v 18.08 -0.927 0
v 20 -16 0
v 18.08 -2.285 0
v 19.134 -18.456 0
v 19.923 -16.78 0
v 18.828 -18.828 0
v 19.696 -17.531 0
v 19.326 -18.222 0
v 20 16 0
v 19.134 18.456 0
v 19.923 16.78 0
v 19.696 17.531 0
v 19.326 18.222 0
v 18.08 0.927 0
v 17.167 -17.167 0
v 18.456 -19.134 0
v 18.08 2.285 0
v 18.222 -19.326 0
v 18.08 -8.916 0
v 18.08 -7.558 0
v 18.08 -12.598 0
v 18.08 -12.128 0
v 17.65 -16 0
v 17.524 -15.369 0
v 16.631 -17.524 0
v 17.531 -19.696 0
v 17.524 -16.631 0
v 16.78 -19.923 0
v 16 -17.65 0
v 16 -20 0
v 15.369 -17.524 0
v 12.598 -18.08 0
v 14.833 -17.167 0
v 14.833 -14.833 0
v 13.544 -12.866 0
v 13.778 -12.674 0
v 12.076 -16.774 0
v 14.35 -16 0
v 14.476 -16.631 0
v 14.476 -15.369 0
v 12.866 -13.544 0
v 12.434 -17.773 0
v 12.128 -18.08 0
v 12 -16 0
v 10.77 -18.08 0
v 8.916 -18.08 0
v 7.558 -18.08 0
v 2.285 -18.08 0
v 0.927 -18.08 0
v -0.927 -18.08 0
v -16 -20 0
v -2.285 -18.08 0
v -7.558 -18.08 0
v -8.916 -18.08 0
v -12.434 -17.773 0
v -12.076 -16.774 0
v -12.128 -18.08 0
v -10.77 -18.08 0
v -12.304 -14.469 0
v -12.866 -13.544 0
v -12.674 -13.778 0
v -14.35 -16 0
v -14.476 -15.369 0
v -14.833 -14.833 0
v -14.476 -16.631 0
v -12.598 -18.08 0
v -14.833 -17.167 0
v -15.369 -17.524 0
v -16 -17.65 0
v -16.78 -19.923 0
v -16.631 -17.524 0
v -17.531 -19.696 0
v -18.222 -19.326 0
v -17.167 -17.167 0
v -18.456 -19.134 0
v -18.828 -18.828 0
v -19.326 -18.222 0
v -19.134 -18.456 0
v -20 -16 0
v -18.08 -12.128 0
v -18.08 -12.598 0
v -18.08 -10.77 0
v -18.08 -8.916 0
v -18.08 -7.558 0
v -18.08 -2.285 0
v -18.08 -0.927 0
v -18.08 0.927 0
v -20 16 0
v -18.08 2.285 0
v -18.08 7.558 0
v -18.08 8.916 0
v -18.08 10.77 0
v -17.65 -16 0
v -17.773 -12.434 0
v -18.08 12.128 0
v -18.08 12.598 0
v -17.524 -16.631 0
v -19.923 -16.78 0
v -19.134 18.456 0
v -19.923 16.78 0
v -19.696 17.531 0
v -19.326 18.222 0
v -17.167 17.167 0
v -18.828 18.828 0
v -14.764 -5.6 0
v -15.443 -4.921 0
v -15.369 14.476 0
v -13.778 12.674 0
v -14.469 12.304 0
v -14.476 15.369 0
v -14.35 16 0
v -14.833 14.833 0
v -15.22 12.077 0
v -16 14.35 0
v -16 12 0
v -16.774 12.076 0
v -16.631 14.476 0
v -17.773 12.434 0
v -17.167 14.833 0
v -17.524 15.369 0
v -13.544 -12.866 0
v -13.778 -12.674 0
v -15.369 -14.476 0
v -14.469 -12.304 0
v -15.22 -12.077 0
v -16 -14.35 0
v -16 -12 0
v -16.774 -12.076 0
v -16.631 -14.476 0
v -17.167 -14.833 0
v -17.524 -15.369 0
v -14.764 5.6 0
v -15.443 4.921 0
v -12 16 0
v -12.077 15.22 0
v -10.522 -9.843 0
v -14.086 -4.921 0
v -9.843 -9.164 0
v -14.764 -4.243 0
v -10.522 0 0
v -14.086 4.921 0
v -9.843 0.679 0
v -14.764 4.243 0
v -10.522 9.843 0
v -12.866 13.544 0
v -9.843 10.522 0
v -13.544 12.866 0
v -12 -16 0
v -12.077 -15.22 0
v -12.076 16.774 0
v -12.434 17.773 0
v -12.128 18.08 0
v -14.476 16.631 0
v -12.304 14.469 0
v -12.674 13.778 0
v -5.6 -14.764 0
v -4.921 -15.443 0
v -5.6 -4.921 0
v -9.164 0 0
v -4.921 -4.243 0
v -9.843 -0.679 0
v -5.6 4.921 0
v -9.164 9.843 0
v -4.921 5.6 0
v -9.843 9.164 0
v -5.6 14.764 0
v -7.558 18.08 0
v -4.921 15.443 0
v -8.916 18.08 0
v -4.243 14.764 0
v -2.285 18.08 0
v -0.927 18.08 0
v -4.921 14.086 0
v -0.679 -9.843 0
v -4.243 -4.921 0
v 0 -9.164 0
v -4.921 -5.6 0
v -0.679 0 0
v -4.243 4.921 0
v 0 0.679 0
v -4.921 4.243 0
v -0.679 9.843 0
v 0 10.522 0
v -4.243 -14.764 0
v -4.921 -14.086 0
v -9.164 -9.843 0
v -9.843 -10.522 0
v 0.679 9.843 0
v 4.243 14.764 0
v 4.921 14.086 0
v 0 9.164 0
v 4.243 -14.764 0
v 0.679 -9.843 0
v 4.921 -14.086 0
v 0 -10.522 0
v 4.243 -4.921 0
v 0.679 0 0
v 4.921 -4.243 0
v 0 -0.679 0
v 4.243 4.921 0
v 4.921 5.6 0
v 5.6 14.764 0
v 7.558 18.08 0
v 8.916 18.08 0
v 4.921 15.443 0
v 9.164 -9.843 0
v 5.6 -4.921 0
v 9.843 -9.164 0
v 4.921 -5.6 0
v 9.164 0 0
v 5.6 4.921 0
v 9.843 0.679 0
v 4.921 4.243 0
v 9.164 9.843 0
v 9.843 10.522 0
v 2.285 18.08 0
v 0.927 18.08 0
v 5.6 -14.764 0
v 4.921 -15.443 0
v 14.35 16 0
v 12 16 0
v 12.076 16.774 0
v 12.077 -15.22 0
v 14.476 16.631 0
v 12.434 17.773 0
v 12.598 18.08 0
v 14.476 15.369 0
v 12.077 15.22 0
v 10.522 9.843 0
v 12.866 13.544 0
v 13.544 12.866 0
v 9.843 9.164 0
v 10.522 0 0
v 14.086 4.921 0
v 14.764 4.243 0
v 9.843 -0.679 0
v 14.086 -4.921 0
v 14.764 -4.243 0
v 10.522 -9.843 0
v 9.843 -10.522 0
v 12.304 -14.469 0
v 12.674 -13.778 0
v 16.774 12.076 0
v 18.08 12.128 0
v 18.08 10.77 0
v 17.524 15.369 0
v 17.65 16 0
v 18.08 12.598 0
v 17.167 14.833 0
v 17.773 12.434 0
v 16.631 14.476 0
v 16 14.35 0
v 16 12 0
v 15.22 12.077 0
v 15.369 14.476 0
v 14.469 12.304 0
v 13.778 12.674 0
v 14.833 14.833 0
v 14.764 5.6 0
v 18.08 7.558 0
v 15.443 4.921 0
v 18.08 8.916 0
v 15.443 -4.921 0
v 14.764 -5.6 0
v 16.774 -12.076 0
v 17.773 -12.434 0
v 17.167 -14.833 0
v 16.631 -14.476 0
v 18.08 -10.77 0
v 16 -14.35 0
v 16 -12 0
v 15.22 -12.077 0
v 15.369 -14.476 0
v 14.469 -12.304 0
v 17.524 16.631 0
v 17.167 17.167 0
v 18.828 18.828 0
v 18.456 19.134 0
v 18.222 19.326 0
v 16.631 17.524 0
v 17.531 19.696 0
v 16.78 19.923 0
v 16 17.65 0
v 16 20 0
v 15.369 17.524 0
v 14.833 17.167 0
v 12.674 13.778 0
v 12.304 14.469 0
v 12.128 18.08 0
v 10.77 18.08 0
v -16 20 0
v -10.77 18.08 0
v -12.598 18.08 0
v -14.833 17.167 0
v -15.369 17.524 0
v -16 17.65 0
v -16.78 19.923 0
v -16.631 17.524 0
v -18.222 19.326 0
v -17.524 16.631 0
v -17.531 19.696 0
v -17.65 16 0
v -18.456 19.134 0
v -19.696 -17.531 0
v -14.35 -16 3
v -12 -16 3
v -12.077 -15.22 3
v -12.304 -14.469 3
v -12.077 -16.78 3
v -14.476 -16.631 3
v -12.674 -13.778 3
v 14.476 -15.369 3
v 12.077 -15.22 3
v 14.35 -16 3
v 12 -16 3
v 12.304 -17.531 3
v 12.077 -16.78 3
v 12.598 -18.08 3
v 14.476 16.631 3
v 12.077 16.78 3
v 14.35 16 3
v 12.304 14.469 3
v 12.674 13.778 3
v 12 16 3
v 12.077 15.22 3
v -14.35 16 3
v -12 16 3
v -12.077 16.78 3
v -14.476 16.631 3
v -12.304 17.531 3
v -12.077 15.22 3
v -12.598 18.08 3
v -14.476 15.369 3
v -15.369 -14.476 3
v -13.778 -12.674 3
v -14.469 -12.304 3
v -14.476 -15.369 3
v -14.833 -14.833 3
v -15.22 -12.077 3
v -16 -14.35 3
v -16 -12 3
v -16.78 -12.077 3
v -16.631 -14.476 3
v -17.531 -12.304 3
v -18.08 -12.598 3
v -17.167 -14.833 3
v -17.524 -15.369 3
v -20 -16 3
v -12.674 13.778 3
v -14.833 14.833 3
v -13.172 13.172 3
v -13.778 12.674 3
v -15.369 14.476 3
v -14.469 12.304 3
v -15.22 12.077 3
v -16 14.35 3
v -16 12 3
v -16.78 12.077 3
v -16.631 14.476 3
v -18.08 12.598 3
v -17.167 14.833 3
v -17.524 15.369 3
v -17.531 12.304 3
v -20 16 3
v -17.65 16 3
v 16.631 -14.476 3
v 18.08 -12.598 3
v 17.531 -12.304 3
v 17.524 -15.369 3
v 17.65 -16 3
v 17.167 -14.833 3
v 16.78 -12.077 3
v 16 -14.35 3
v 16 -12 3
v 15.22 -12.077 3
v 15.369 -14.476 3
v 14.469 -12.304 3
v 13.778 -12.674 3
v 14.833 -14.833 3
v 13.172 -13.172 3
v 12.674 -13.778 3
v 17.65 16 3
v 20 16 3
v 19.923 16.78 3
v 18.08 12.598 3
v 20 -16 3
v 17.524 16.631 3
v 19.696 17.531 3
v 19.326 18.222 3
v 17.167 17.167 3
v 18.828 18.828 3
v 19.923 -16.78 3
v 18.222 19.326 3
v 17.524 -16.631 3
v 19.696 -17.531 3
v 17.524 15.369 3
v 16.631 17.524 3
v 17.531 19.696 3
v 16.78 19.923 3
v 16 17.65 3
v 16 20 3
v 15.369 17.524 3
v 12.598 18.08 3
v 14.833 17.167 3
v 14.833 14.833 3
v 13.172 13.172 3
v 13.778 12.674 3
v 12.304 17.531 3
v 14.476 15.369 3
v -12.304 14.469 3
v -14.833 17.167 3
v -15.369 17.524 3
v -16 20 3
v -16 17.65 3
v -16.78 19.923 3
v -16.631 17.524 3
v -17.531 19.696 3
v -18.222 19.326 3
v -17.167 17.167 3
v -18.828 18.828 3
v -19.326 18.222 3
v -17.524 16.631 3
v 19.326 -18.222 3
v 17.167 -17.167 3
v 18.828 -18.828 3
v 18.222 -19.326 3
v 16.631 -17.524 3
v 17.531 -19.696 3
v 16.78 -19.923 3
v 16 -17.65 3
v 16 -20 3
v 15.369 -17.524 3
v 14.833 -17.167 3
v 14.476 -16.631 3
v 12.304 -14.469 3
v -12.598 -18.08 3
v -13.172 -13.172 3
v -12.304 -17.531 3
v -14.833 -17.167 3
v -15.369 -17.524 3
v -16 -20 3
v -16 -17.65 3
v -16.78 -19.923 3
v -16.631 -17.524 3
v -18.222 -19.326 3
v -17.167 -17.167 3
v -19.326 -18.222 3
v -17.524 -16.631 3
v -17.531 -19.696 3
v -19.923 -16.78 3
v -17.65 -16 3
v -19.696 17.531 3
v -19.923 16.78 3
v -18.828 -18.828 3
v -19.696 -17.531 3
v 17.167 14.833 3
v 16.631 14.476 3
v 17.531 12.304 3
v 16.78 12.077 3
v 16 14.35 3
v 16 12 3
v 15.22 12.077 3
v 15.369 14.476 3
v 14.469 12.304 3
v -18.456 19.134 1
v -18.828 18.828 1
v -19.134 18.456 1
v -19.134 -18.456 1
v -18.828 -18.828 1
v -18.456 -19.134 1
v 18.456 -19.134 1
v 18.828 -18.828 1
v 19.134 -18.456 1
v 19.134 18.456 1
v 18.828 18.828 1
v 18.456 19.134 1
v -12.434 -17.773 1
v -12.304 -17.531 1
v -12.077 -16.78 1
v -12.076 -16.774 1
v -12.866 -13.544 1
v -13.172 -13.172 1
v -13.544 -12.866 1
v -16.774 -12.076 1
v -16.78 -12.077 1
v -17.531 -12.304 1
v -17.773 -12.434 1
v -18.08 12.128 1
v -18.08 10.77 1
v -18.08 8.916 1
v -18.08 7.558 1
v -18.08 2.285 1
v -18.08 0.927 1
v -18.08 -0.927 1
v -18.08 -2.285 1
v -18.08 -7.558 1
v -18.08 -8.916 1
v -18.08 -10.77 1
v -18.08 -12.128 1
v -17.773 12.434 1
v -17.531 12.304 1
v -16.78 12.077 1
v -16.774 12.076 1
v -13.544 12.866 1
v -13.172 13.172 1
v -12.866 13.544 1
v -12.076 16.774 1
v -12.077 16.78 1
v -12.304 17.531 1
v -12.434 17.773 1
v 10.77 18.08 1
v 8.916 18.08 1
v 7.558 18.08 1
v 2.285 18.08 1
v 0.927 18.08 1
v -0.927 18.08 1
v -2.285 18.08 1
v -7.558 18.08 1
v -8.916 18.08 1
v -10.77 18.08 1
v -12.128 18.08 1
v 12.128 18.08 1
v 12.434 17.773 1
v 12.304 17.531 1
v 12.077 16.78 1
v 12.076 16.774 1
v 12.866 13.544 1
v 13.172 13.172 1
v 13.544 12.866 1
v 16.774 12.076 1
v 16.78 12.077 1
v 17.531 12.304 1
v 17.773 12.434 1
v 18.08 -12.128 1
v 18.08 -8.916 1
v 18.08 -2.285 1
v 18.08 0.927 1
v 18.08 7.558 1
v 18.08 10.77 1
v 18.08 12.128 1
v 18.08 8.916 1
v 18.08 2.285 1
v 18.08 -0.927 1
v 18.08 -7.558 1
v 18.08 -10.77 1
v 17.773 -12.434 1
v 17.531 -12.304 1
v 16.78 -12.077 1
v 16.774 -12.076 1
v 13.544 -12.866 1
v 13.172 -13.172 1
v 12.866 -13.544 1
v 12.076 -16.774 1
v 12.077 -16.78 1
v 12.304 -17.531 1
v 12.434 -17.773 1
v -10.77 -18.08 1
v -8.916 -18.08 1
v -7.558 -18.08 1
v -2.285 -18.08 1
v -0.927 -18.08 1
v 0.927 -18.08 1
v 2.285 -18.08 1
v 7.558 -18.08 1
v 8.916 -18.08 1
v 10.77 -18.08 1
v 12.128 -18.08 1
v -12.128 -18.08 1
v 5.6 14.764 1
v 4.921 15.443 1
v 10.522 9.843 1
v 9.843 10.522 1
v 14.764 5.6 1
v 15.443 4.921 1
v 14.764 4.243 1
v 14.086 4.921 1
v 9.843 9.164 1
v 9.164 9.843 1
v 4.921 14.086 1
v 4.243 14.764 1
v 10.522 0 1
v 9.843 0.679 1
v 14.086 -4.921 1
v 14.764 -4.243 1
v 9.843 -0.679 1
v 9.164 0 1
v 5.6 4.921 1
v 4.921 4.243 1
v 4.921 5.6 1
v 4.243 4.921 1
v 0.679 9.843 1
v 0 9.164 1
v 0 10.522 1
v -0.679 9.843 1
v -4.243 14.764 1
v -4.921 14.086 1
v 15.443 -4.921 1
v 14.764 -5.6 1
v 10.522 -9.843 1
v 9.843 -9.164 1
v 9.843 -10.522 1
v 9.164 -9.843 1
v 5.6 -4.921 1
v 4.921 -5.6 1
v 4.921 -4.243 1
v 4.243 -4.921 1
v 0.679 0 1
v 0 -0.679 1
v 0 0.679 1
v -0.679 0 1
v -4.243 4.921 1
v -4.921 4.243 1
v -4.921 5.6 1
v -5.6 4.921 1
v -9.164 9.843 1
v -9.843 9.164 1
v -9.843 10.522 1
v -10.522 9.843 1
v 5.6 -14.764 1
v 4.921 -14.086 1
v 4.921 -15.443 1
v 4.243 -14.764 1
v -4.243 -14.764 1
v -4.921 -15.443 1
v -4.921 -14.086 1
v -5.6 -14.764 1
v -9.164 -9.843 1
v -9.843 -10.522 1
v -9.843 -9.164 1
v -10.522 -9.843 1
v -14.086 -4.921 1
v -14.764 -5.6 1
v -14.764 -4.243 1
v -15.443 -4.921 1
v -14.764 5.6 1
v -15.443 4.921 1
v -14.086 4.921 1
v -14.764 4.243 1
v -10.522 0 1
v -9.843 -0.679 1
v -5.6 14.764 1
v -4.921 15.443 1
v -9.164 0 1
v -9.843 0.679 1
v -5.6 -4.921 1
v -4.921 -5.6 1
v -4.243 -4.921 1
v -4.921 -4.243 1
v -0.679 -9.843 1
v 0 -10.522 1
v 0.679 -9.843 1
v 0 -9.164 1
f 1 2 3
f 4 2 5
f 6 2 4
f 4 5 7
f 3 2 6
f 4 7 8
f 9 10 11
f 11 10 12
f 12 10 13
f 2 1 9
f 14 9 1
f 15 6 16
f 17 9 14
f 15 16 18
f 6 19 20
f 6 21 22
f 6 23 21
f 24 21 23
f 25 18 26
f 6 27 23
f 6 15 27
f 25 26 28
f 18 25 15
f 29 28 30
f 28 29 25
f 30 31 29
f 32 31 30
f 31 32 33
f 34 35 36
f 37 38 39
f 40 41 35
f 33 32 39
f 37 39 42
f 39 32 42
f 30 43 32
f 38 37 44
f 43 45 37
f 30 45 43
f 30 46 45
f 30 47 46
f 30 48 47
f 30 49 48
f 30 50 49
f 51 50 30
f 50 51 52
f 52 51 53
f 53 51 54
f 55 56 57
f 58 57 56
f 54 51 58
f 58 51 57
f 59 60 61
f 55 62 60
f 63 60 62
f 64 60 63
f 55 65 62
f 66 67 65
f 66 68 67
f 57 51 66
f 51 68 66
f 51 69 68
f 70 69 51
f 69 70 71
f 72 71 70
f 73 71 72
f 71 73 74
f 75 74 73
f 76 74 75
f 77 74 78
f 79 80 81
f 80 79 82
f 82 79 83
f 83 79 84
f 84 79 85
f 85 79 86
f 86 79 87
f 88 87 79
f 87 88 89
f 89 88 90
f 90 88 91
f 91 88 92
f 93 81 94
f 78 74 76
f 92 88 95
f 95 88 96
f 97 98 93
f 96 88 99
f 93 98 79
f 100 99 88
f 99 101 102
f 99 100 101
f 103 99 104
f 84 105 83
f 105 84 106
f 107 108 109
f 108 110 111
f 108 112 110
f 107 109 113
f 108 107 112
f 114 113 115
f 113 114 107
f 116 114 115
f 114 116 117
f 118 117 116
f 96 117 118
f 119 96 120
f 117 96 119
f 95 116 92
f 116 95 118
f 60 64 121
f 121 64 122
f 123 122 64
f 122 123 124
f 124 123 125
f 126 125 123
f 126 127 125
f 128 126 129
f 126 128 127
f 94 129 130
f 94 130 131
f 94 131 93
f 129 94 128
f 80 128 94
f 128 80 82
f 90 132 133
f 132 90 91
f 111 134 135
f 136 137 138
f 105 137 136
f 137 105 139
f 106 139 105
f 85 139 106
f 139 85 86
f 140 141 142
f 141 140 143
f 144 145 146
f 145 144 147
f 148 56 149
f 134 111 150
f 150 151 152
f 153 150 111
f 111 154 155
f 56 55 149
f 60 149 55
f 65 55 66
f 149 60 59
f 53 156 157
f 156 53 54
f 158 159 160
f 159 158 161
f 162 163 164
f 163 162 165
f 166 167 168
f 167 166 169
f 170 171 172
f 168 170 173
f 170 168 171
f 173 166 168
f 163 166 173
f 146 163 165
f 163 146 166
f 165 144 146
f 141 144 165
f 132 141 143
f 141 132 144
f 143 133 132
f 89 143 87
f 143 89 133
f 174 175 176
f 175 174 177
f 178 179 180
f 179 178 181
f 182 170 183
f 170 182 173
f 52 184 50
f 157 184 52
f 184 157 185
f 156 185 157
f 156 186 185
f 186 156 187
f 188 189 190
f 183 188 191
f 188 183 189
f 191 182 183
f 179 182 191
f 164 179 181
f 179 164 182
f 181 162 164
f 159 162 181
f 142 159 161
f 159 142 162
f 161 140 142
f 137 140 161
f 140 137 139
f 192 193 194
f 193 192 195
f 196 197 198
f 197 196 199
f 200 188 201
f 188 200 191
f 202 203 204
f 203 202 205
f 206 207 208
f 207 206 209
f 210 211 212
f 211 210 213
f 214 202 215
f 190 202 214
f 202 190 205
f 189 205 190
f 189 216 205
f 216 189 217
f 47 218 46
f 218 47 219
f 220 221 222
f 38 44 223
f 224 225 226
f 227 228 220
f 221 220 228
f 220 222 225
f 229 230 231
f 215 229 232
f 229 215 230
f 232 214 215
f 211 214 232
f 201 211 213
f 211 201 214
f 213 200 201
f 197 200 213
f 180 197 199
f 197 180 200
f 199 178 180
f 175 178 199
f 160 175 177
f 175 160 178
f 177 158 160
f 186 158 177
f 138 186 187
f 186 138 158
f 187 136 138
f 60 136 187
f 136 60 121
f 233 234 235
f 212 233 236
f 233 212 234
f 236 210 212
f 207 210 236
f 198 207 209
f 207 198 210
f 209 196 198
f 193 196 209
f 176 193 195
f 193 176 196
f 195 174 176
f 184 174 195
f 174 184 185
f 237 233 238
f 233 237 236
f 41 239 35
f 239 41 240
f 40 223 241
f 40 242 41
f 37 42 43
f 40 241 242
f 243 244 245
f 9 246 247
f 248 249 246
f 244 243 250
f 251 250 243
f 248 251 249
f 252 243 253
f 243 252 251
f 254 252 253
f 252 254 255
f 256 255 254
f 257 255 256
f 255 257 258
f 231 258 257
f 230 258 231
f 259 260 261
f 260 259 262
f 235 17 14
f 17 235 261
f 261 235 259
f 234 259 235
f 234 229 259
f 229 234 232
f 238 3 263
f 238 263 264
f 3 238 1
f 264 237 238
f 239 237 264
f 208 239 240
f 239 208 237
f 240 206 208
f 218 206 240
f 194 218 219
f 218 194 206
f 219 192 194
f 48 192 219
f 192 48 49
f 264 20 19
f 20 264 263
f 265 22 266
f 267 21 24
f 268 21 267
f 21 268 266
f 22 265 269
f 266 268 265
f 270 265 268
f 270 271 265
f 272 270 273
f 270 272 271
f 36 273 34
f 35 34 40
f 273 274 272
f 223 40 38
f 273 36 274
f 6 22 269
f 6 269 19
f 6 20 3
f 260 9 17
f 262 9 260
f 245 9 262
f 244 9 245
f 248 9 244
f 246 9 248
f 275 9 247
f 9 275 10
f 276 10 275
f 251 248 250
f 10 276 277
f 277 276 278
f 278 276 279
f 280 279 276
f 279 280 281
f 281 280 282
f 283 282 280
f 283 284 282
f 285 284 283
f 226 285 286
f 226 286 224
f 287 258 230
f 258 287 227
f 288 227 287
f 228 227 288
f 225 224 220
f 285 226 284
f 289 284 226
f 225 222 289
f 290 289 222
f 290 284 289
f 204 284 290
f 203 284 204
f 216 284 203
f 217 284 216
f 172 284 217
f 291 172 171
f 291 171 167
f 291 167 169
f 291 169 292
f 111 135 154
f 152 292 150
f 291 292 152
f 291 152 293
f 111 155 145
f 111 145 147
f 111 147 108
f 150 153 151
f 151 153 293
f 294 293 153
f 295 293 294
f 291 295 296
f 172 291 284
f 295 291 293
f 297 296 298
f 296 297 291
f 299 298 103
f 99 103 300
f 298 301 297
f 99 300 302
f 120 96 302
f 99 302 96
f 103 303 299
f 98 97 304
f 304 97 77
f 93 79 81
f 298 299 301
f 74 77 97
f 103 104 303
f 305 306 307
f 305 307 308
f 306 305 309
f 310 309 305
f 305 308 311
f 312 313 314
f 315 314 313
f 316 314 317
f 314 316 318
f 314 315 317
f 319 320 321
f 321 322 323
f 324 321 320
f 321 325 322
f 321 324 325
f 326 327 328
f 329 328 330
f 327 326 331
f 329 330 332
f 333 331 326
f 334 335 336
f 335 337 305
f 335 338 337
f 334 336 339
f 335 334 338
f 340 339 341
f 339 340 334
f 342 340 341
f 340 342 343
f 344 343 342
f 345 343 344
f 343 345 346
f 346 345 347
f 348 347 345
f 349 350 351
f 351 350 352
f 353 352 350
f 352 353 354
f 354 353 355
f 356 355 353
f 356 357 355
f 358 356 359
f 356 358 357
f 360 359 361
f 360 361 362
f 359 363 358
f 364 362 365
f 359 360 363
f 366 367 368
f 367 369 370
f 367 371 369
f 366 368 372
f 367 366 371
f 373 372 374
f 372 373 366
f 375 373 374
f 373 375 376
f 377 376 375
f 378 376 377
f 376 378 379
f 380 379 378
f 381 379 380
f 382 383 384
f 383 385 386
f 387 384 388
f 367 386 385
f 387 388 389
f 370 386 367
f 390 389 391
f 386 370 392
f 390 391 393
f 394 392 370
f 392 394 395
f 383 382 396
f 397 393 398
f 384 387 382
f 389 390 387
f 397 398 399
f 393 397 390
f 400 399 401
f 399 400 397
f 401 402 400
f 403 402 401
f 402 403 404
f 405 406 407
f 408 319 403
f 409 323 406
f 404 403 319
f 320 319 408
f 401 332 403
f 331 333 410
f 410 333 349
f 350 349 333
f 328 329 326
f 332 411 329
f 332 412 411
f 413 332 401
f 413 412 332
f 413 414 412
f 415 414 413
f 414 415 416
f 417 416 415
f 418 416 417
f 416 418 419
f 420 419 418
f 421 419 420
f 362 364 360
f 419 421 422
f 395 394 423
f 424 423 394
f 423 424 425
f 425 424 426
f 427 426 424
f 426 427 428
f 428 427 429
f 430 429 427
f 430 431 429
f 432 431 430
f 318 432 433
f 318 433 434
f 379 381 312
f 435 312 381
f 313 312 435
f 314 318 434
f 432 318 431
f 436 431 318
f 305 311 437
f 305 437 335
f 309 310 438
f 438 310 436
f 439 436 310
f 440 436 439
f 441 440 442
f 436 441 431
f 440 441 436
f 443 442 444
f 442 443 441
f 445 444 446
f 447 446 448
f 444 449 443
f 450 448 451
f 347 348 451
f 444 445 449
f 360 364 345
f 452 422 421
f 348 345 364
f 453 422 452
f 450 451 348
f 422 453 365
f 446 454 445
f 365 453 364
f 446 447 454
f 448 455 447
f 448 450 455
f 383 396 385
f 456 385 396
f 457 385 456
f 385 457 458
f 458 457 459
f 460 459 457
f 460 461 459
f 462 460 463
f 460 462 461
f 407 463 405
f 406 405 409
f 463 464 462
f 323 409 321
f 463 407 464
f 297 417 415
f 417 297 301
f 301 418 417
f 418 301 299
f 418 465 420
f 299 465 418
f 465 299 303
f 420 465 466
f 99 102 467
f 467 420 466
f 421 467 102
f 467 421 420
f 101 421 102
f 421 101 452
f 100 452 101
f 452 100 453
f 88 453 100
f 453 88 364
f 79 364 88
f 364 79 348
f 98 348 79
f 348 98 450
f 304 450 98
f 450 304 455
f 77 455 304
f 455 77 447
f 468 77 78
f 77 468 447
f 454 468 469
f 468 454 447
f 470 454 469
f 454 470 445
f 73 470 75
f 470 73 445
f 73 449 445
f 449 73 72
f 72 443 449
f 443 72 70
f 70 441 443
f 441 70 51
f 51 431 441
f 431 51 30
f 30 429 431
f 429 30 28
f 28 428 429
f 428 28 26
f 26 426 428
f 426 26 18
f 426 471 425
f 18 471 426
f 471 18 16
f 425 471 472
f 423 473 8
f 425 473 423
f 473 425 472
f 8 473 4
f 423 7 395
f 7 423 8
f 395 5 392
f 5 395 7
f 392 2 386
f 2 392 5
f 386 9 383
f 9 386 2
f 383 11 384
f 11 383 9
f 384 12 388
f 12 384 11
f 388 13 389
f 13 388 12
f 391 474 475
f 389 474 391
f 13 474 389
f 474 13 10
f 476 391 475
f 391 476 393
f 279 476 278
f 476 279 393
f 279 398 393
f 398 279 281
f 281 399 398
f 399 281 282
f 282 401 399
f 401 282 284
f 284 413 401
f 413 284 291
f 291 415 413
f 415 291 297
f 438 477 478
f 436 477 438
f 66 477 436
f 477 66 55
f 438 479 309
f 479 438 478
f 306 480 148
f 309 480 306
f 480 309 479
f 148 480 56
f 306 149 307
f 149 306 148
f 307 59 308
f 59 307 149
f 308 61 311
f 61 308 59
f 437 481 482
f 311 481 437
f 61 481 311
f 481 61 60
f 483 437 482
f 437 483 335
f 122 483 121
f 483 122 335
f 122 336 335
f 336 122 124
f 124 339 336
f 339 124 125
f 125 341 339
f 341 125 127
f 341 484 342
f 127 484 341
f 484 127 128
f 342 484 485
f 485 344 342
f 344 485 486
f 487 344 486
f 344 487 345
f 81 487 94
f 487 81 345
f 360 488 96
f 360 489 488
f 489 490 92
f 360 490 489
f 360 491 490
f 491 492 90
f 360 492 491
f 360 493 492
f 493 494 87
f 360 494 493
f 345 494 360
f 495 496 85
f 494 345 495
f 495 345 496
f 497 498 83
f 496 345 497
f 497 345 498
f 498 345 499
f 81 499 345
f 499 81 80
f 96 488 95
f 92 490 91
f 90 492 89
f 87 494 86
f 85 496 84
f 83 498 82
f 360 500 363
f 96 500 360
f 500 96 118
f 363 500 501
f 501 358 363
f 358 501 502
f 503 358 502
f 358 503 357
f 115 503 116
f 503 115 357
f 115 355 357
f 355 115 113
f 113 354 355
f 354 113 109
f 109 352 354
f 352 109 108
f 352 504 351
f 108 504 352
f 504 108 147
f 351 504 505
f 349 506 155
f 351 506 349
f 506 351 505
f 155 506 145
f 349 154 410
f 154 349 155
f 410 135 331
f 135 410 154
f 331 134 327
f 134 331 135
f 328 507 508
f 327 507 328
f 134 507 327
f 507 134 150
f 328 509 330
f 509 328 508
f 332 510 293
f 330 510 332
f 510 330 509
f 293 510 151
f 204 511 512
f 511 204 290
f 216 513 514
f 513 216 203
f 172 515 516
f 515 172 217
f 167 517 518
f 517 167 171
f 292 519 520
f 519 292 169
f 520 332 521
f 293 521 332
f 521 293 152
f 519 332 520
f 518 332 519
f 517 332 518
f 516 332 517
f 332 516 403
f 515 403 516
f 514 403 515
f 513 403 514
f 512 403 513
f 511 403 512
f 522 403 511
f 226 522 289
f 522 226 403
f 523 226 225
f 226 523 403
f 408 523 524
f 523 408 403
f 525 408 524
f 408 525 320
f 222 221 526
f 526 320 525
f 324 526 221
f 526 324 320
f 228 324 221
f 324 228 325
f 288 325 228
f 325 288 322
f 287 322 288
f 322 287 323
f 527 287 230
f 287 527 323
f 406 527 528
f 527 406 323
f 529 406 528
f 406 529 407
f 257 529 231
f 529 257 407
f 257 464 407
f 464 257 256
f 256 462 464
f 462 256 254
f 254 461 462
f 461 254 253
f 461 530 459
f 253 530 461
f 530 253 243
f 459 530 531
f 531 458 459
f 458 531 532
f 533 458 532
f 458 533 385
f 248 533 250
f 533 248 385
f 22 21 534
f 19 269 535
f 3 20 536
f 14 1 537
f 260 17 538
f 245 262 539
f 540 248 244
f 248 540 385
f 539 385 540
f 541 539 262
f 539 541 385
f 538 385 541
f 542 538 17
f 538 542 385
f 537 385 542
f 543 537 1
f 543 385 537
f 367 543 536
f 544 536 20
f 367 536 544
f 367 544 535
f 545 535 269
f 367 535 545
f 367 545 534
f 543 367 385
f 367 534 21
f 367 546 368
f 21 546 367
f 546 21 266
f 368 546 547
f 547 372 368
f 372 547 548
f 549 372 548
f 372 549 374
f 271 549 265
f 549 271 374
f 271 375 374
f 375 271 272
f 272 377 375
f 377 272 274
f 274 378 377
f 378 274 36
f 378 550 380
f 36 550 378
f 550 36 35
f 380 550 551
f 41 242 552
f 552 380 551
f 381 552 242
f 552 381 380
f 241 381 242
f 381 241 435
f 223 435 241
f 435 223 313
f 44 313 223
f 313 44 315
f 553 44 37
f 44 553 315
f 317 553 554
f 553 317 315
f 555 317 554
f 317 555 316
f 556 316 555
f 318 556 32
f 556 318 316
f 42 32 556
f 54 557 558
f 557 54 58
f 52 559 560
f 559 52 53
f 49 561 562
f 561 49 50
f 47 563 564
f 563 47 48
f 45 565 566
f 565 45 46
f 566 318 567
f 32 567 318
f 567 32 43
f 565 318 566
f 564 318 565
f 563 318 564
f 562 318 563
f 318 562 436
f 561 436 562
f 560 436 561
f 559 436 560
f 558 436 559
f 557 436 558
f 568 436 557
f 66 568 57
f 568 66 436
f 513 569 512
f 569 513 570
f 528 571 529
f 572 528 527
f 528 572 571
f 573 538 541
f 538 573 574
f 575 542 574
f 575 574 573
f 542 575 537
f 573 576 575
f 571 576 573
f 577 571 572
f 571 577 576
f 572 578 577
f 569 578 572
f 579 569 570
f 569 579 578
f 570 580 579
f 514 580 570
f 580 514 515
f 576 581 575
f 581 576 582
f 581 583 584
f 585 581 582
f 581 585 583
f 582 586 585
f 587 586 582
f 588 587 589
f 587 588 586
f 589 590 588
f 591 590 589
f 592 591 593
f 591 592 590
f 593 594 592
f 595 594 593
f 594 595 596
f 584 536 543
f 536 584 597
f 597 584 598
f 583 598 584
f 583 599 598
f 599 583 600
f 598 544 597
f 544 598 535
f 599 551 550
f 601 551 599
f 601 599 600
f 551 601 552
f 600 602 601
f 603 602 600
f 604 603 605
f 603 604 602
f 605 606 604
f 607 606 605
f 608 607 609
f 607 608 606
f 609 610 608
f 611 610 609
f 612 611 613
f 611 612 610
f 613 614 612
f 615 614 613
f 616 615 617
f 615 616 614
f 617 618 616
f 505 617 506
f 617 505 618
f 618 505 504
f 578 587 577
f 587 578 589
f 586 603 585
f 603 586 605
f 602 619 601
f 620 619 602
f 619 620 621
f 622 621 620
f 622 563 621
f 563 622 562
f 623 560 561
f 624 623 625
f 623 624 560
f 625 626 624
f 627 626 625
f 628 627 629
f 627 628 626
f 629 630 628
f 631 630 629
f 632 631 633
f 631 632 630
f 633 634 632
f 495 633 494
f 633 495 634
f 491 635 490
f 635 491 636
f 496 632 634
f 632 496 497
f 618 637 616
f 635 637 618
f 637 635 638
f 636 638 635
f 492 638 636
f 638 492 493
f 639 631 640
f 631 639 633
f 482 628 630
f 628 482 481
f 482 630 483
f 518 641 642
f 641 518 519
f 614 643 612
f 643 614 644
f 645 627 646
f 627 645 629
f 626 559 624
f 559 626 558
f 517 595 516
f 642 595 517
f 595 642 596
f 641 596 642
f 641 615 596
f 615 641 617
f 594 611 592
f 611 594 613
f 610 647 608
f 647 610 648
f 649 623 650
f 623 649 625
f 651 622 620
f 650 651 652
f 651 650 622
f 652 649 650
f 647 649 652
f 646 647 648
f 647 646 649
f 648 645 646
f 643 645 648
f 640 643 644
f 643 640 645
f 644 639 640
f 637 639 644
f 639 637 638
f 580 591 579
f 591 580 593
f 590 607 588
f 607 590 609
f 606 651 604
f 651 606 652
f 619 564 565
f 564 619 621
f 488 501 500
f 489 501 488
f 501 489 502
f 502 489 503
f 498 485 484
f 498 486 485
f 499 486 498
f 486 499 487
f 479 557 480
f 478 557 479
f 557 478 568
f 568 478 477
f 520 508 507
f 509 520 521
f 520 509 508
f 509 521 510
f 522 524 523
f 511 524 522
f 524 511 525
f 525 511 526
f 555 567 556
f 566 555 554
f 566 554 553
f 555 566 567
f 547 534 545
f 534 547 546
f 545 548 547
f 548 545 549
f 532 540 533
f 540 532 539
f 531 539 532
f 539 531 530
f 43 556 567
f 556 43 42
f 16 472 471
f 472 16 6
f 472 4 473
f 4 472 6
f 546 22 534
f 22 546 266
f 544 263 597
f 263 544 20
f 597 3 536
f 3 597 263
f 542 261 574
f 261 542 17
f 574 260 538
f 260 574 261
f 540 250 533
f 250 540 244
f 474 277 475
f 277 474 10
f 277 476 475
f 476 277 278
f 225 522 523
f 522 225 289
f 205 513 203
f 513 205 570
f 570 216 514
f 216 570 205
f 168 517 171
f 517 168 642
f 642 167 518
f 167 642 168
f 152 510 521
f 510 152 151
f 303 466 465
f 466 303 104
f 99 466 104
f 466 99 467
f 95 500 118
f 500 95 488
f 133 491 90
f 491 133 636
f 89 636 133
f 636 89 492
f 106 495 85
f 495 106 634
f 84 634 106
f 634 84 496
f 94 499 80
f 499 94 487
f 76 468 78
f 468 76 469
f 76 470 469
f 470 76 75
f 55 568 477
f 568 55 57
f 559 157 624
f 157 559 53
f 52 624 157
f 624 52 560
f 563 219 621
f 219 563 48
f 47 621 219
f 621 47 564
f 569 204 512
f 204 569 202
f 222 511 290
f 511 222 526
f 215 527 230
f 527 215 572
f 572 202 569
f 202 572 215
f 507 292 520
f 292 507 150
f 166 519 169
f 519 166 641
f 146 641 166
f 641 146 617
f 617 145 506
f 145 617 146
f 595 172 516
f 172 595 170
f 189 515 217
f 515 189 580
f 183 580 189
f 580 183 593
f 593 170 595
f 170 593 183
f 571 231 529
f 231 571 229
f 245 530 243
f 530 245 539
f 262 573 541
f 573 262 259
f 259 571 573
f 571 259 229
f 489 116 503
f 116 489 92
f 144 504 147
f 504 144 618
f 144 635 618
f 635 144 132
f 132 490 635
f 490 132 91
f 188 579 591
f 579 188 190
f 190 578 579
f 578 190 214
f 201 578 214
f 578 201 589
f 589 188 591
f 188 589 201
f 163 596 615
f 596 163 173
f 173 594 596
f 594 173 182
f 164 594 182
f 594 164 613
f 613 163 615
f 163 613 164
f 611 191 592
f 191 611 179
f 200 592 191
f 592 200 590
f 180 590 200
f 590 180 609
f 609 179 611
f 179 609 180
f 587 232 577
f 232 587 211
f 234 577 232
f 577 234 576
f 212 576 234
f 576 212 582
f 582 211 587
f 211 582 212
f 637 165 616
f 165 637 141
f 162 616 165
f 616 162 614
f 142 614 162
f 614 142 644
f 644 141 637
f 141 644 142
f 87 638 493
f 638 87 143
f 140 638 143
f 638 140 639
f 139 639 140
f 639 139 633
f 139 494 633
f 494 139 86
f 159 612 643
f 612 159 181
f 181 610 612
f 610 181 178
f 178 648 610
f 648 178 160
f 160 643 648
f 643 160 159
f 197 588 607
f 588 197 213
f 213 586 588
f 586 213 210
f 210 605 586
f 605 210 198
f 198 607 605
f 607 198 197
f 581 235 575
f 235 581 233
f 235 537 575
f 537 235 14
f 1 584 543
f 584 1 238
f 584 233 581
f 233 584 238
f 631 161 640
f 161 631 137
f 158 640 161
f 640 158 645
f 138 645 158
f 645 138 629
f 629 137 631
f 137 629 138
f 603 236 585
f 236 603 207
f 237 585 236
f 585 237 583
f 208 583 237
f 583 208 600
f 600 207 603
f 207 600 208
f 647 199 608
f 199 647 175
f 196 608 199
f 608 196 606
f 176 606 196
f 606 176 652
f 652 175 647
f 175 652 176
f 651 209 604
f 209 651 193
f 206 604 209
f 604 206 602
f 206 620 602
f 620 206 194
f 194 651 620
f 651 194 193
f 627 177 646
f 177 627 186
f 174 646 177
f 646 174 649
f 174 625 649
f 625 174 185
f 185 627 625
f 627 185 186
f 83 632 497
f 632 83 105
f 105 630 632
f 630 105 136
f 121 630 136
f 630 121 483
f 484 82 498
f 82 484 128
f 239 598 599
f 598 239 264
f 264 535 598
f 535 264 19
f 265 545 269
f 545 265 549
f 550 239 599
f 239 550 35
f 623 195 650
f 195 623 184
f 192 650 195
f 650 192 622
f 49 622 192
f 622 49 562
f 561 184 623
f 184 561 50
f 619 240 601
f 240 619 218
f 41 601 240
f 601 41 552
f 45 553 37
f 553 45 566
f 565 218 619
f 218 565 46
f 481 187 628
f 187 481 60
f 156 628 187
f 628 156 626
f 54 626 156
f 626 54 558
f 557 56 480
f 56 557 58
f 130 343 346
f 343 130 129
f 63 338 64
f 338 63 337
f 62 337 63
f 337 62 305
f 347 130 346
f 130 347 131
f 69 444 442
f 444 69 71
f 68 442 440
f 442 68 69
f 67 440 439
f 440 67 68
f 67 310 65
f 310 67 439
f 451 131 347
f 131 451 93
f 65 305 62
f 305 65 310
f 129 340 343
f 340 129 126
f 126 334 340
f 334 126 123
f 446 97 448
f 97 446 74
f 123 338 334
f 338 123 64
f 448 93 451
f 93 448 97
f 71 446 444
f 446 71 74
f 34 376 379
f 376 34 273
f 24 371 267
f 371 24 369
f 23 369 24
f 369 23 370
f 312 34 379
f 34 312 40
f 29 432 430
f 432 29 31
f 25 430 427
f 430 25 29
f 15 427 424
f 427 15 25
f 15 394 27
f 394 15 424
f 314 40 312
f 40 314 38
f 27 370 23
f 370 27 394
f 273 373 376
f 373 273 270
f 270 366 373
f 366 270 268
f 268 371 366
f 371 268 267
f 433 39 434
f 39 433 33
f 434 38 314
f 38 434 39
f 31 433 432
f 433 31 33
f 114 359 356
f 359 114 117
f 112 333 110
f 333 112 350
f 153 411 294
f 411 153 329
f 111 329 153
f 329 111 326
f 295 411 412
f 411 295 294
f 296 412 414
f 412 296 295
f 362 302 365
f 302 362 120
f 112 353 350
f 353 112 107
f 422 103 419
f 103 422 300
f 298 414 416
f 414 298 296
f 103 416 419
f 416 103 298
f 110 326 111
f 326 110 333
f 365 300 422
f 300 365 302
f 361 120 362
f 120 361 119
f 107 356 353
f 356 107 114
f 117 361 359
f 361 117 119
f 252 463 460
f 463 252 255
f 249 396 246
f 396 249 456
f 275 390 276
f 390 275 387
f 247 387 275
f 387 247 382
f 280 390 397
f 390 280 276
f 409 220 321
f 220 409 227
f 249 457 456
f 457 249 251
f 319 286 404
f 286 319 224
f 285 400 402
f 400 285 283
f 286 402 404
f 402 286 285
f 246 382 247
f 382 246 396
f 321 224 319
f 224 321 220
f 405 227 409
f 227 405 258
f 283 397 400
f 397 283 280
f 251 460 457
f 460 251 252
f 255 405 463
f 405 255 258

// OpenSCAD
/*
 * Customizable Fan Cover - https://www.thingiverse.com/thing:2802474
 * by Dennis Hofmann - https://www.thingiverse.com/mightynozzle/about
 * created 2018-02-22
 * updated 2018-03-27
 * version v1.2
 *
 * Changelog
 * --------------
 * v1.2:
 *      - better quality of rounded corners and crosshair pattern
 * v1.1:
 *      - added support line option for crosshair and square pattern
 * v1.0:
 *      - final design
 * --------------
 *
 * This work is licensed under the Creative Commons - Attribution - Non-Commercial - ShareAlike license.
 * https://creativecommons.org/licenses/by-nc-sa/3.0/
 */


 // Parameter Section //
//-------------------//

/* [Global Settings] */

// Choose between presets of known and common fan sizes.
fan_preset = "custom"; //[25:25mm,30:30mm,40:40mm,50:50mm,60:60mm,70:70mm,80:80mm,92:92mm,120:120mm,140:140mm,custom:Custom Fan Settings]

// If you want save to save about 40% filament and about 20% printing time, you can choose the reduced frame option.
frame_option = "reduced"; //[full,reduced]

// Minimum Border Size. I recommend to use two/four/six... times of your line width setting of your slicer. Simplify3D uses 0.48mm line width by default if you are using a 0.4mm nozzle. Cura uses 0.4mm line width.
min_border_size_in_millimeter = 1.92;

// Choose between a grill pattern
grill_pattern = "grid"; //[honeycomb,grid,line,triangle,crosshair,square,dot,aperture]

// Set the angle of the pattern around the center of the cover.
grill_pattern_rotation = 45; //[0:5:360]

// Size of the pattern lines. I recommend to use two/four/six... times of your line width setting of your slicer. Simplify3D uses 0.48mm line width by default if you are using a 0.4mm nozzle. Cura uses 0.4mm line width.
line_size_in_millimter = 0.96; //[0.3:0.02:4]

// Space between two lines of your pattern. If you choose aperture pattern, this value set the size of the center octagon.
line_space_in_millimeter = 6; //[1:0.1:50]

// If you need countersunk holes, you can activate it here. Bottom = first layer. Top = last layer. 
screw_hole_chamfer = "no"; //[no,top,bottom,top_and_bottom]

// Activate or deactivate rounded corners. The radius will be automatically calculated.
rounded_corners = "yes"; //[yes,no]

// number of straight lines supporting the crosshair or square pattern.
number_of_support_lines = 2;  //[1:1:36]

/* [Custom Fan Settings] */

// Cover size. E.g. 80 for a 80mm Fan
cover_size_in_millimeter = 40;

// E.g. 2.9 for M2.5, 3.3 for M3, 4.4 for M4
screw_hole_diameter_in_millimeter = 3.3;

// 25mm fan: 20 | 30mm fan: 24 | 40mm fan: 32 | 50mm fan: 40 | 60mm fan: 50 | 70mm fan: 61.5 | 80mm fan: 71.5 | 92mm fan: 82.5 | 120mm fan: 105 | 140mm fan: 126 
screw_hole_distance_in_millimeter = 32;

// Height of the outer frame of the cover
cover_height_in_millimeter = 3;

// Height of the pattern inside the cover frame
grill_pattern_height_in_millimeter = 1;

/* [Hidden] */
min_border_size = min_border_size_in_millimeter;
line_size = line_size_in_millimter;
line_space = line_space_in_millimeter;

 // Program Section //
//-----------------//

if(fan_preset == "25") {
    fan_cover(cover_size = 25, screw_hole_dia = 2.9, screw_hole_distance = 20, cover_h = 2, grill_pattern_h = 1);
}
if(fan_preset == "30") {
    fan_cover(cover_size = 30, screw_hole_dia = 3.3, screw_hole_distance = 24, cover_h = 2.5, grill_pattern_h = 1.1);
}
if(fan_preset == "40") {
    fan_cover(cover_size = 40, screw_hole_dia = 3.3, screw_hole_distance = 32, cover_h = 2.7, grill_pattern_h = 1.2);
}
if(fan_preset == "50") {
    fan_cover(cover_size = 50, screw_hole_dia = 4.4, screw_hole_distance = 40, cover_h = 2.9, grill_pattern_h = 1.3);
}
if(fan_preset == "60") {
    fan_cover(cover_size = 60, screw_hole_dia = 4.4, screw_hole_distance = 50, cover_h = 3, grill_pattern_h = 1.3);
}
if(fan_preset == "70") {
    fan_cover(cover_size = 70, screw_hole_dia = 4.4, screw_hole_distance = 61.5, cover_h = 3, grill_pattern_h = 1.4);
}
if(fan_preset == "80") {
    fan_cover(cover_size = 80, screw_hole_dia = 4.4, screw_hole_distance = 71.5, cover_h = 3.2, grill_pattern_h = 1.5);
}
if(fan_preset == "92") {
    fan_cover(cover_size = 92, screw_hole_dia = 4.4, screw_hole_distance = 82.5, cover_h = 3.5, grill_pattern_h = 1.6);
}
if(fan_preset == "120") {
    fan_cover(cover_size = 120, screw_hole_dia = 4.4, screw_hole_distance = 105, cover_h = 4, grill_pattern_h = 1.8);
}
if(fan_preset == "140") {
    fan_cover(cover_size = 140, screw_hole_dia = 4.4, screw_hole_distance = 126, cover_h = 4.5, grill_pattern_h = 2.0);
}
if(fan_preset == "custom") {
    fan_cover(cover_size = cover_size_in_millimeter, screw_hole_dia = screw_hole_diameter_in_millimeter, screw_hole_distance = screw_hole_distance_in_millimeter, cover_h = cover_height_in_millimeter, grill_pattern_h = grill_pattern_height_in_millimeter);
}


 // Module Section //
//----------------//

module fan_cover(cover_size, screw_hole_dia, screw_hole_distance, cover_h, grill_pattern_h) {
    corner_size = cover_size - screw_hole_distance;
    corner_r = rounded_corners == "yes" ? corner_size / 2 : 0;
    screw_pos = (cover_size - corner_size) / 2;
    color("DodgerBlue") difference() {
        union() {
            linear_extrude(height = cover_h, convexity = 20) {
                difference() {
                    offset(r=corner_r, $fn = ceil(corner_r * 8)) {
                        offset(r=-corner_r) {
                            square([cover_size, cover_size], center = true);
                        }
                    }
                    if(frame_option == "reduced") {
                        offset(r=corner_r, $fn = ceil(corner_r * 8)) {
                            offset(r=-corner_r) {
                                square([cover_size - min_border_size*2, cover_size - min_border_size*2], center = true);
                            }
                        }
                    }
                    if(frame_option == "full") {
                        circle(d = cover_size - min_border_size * 2, $fn = cover_size);
                    }
                } 
                if(frame_option == "reduced") {
                    for(y = [-1:2:1]) {
                        for(x = [-1:2:1]) {
                            translate([screw_pos * x, screw_pos * y, -2]) {
                                circle(d = corner_size, $fn = ceil(corner_r * 8));
                            }
                        }
                    }
                }
            }
            linear_extrude(height = grill_pattern_h, convexity = 20) {
                intersection() {
                    offset(r=corner_r, $fn = ceil(corner_r * 8)) {
                        offset(r=-corner_r) {
                            square([cover_size, cover_size], center = true);
                        }
                    }
                    rotate(grill_pattern_rotation) {
                        if(grill_pattern == "honeycomb") {
                            honeycomb_pattern(cover_size, line_size, line_space);
                        }
                        if(grill_pattern == "grid") {
                            grid_pattern(cover_size, line_size, line_space);
                        }
                        if(grill_pattern == "line") {
                            line_pattern(cover_size, line_size, line_space);
                        }
                        if(grill_pattern == "triangle") {
                            triangle_pattern(cover_size, line_size, line_space);
                        }
                        if(grill_pattern == "crosshair") {
                            crosshair_pattern(cover_size, line_size, line_space);
                        }
                        if(grill_pattern == "square") {
                            square_pattern(cover_size, line_size, line_space);
                        }
                        if(grill_pattern == "dot") {
                            dot_pattern(cover_size, line_size, line_space);
                        }
                        if(grill_pattern == "aperture") {
                            aperture_pattern(cover_size, line_size, line_space);
                        }
                        
                    }
                }
            }
        }
        for(y = [-1:2:1]) {
            for(x = [-1:2:1]) {
                translate([screw_pos * x, screw_pos * y, -2]) {
                    screw_hole(cover_h, screw_hole_dia);
                }
            }
        }
    }
}

module screw_hole(cover_h, screw_hole_dia) {
    cylinder(h = cover_h + 4, d = screw_hole_dia, $fn = 16);
    if(screw_hole_chamfer == "bottom" || screw_hole_chamfer == "top_and_bottom") {
        translate([0, 0, 2.9 - screw_hole_dia]) {
            cylinder(h = screw_hole_dia, d1 = screw_hole_dia * 4, d2 = screw_hole_dia);
        }
    }
    if(screw_hole_chamfer == "top" || screw_hole_chamfer == "top_and_bottom") {
        translate([0, 0, cover_h + screw_hole_dia/4]) {
            cylinder(h = screw_hole_dia, d2 = screw_hole_dia * 4, d1 = screw_hole_dia);
        }
    }
}

module grid_pattern(size, line_size, line_space) {
    num = ceil(size / (line_size + line_space) * 1.42);
    for(x = [floor(-num / 2) : ceil(num / 2)]) {
        translate([x * (line_size + line_space), 0]) {
            square([line_size, num *(line_size + line_space)], center=true);
        }
        rotate(90) {
            translate([x * (line_size + line_space), 0]) {
                square([line_size, num *(line_size + line_space)], center = true);
            }
        }
    }
}

module triangle_pattern(size, line_size, line_space) {
    num = ceil(size / (line_size + line_space) * 1.42);
    for(x = [floor(-num / 2):ceil(num / 2)]) {
        translate([x * (line_size + line_space), 0]) {
            square([line_size, num *(line_size + line_space)], center = true);
        }
        rotate(60) {
            translate([x * (line_size + line_space), 0]) {
                square([line_size, num *(line_size + line_space)], center = true);
            }
        }
        rotate(120) {
            translate([x * (line_size + line_space), 0]) {
                square([line_size, num *(line_size + line_space)], center = true);
            }
        }
    }
}

module line_pattern(size, line_size, line_space) {
    num = ceil(size / (line_size + line_space)*1.42);
    for(x = [floor(-num / 2):ceil(num / 2)]) {
        translate([x * (line_size + line_space), 0]) {
            square([line_size, num *(line_size + line_space)], center=true);
        }
    }
}

module crosshair_pattern(size, line_size, line_space) {
    line = (line_size + line_space) * 2;
    num = ceil(size / line * 1.42);
    for(n = [1:num]) {
        difference() {
            circle(d = n * line + line_size * 2, $fn = ceil(n * line + line_size * 2));
            circle(d = n * line, $fn = ceil(n * line + line_size * 2));
        }
    }
    for(rot=[0:90 / number_of_support_lines * 2:180]) {
        rotate(rot + 45) square([size * 2, line_size], center = true);
    }
}

module square_pattern(size, line_size, line_space) {
    line = (line_size + line_space) * 2;
    num = ceil(size / line * 1.42); 
    for(n = [1:num]) {
        difference() {
            square([n * line + line_size * 2, n * line + line_size * 2], center = true);
            square([n * line, n * line], center = true);
        }
    }
    for(rot=[0:90 / number_of_support_lines * 2:180]) {
        rotate(rot + 45) square([size * 2, line_size], center = true);
    }
}

module honeycomb_pattern(size, line_size, line_space) {
    min_rad = (line_space / 2 * sqrt(3)) / 2 + line_size / 2;
    y_offset = sqrt(min_rad * min_rad * 4 - min_rad * min_rad);
    num_x = ceil(size / min_rad / 2) * 1.42;
    num_y = ceil(size / y_offset) * 1.42;
    difference() {
        square([size * 1.42, size * 1.42], center = true);
        for(y = [floor(-num_y / 2) : ceil(num_y / 2)]) {
            odd = (y % 2 == 0) ? 0 : min_rad;
            for(x = [floor(-num_x / 2) : ceil(num_x / 2)]) {
                translate([x * min_rad * 2 + odd, y * y_offset]) {
                    rotate(30) {
                        circle(d=line_space, $fn=6);
                    }
                }
            }
        }
    }
}

module dot_pattern(size, line_size, line_space) {
    rad = line_space / 2;
    y_offset = sqrt((rad + line_size / 2) * (rad + line_size / 2) * 4 - (rad + line_size / 2) * (rad + line_size / 2));
    num_x = ceil(size / rad / 2) * 1.42;
    num_y = ceil(size / y_offset) * 1.42;
    difference() {
        square([size * 1.42, size * 1.42], center = true);
        for(y = [floor(-num_y / 2) : ceil(num_y / 2)]) {
            odd = (y % 2 == 0) ? 0 : rad + line_size / 2;
            for(x = [floor(-num_x / 2) : ceil(num_x / 2)]) {
                translate([x * (rad + line_size / 2) * 2 + odd, y * y_offset]) {
                    rotate(30) {
                        circle(d=line_space);
                    }
                }
            }
        }
    }
}

module aperture_pattern(size, line_size, line_space) {
    circle(d = line_space, $fn = 8);
    for(rot = [1:2:15]) {
        rotate(360 / 16 * rot) {
            translate([line_space / 2 * cos(360 / 16) - line_size, -line_size]) {
                square([line_size, size]);
            }
        }
    }
}
